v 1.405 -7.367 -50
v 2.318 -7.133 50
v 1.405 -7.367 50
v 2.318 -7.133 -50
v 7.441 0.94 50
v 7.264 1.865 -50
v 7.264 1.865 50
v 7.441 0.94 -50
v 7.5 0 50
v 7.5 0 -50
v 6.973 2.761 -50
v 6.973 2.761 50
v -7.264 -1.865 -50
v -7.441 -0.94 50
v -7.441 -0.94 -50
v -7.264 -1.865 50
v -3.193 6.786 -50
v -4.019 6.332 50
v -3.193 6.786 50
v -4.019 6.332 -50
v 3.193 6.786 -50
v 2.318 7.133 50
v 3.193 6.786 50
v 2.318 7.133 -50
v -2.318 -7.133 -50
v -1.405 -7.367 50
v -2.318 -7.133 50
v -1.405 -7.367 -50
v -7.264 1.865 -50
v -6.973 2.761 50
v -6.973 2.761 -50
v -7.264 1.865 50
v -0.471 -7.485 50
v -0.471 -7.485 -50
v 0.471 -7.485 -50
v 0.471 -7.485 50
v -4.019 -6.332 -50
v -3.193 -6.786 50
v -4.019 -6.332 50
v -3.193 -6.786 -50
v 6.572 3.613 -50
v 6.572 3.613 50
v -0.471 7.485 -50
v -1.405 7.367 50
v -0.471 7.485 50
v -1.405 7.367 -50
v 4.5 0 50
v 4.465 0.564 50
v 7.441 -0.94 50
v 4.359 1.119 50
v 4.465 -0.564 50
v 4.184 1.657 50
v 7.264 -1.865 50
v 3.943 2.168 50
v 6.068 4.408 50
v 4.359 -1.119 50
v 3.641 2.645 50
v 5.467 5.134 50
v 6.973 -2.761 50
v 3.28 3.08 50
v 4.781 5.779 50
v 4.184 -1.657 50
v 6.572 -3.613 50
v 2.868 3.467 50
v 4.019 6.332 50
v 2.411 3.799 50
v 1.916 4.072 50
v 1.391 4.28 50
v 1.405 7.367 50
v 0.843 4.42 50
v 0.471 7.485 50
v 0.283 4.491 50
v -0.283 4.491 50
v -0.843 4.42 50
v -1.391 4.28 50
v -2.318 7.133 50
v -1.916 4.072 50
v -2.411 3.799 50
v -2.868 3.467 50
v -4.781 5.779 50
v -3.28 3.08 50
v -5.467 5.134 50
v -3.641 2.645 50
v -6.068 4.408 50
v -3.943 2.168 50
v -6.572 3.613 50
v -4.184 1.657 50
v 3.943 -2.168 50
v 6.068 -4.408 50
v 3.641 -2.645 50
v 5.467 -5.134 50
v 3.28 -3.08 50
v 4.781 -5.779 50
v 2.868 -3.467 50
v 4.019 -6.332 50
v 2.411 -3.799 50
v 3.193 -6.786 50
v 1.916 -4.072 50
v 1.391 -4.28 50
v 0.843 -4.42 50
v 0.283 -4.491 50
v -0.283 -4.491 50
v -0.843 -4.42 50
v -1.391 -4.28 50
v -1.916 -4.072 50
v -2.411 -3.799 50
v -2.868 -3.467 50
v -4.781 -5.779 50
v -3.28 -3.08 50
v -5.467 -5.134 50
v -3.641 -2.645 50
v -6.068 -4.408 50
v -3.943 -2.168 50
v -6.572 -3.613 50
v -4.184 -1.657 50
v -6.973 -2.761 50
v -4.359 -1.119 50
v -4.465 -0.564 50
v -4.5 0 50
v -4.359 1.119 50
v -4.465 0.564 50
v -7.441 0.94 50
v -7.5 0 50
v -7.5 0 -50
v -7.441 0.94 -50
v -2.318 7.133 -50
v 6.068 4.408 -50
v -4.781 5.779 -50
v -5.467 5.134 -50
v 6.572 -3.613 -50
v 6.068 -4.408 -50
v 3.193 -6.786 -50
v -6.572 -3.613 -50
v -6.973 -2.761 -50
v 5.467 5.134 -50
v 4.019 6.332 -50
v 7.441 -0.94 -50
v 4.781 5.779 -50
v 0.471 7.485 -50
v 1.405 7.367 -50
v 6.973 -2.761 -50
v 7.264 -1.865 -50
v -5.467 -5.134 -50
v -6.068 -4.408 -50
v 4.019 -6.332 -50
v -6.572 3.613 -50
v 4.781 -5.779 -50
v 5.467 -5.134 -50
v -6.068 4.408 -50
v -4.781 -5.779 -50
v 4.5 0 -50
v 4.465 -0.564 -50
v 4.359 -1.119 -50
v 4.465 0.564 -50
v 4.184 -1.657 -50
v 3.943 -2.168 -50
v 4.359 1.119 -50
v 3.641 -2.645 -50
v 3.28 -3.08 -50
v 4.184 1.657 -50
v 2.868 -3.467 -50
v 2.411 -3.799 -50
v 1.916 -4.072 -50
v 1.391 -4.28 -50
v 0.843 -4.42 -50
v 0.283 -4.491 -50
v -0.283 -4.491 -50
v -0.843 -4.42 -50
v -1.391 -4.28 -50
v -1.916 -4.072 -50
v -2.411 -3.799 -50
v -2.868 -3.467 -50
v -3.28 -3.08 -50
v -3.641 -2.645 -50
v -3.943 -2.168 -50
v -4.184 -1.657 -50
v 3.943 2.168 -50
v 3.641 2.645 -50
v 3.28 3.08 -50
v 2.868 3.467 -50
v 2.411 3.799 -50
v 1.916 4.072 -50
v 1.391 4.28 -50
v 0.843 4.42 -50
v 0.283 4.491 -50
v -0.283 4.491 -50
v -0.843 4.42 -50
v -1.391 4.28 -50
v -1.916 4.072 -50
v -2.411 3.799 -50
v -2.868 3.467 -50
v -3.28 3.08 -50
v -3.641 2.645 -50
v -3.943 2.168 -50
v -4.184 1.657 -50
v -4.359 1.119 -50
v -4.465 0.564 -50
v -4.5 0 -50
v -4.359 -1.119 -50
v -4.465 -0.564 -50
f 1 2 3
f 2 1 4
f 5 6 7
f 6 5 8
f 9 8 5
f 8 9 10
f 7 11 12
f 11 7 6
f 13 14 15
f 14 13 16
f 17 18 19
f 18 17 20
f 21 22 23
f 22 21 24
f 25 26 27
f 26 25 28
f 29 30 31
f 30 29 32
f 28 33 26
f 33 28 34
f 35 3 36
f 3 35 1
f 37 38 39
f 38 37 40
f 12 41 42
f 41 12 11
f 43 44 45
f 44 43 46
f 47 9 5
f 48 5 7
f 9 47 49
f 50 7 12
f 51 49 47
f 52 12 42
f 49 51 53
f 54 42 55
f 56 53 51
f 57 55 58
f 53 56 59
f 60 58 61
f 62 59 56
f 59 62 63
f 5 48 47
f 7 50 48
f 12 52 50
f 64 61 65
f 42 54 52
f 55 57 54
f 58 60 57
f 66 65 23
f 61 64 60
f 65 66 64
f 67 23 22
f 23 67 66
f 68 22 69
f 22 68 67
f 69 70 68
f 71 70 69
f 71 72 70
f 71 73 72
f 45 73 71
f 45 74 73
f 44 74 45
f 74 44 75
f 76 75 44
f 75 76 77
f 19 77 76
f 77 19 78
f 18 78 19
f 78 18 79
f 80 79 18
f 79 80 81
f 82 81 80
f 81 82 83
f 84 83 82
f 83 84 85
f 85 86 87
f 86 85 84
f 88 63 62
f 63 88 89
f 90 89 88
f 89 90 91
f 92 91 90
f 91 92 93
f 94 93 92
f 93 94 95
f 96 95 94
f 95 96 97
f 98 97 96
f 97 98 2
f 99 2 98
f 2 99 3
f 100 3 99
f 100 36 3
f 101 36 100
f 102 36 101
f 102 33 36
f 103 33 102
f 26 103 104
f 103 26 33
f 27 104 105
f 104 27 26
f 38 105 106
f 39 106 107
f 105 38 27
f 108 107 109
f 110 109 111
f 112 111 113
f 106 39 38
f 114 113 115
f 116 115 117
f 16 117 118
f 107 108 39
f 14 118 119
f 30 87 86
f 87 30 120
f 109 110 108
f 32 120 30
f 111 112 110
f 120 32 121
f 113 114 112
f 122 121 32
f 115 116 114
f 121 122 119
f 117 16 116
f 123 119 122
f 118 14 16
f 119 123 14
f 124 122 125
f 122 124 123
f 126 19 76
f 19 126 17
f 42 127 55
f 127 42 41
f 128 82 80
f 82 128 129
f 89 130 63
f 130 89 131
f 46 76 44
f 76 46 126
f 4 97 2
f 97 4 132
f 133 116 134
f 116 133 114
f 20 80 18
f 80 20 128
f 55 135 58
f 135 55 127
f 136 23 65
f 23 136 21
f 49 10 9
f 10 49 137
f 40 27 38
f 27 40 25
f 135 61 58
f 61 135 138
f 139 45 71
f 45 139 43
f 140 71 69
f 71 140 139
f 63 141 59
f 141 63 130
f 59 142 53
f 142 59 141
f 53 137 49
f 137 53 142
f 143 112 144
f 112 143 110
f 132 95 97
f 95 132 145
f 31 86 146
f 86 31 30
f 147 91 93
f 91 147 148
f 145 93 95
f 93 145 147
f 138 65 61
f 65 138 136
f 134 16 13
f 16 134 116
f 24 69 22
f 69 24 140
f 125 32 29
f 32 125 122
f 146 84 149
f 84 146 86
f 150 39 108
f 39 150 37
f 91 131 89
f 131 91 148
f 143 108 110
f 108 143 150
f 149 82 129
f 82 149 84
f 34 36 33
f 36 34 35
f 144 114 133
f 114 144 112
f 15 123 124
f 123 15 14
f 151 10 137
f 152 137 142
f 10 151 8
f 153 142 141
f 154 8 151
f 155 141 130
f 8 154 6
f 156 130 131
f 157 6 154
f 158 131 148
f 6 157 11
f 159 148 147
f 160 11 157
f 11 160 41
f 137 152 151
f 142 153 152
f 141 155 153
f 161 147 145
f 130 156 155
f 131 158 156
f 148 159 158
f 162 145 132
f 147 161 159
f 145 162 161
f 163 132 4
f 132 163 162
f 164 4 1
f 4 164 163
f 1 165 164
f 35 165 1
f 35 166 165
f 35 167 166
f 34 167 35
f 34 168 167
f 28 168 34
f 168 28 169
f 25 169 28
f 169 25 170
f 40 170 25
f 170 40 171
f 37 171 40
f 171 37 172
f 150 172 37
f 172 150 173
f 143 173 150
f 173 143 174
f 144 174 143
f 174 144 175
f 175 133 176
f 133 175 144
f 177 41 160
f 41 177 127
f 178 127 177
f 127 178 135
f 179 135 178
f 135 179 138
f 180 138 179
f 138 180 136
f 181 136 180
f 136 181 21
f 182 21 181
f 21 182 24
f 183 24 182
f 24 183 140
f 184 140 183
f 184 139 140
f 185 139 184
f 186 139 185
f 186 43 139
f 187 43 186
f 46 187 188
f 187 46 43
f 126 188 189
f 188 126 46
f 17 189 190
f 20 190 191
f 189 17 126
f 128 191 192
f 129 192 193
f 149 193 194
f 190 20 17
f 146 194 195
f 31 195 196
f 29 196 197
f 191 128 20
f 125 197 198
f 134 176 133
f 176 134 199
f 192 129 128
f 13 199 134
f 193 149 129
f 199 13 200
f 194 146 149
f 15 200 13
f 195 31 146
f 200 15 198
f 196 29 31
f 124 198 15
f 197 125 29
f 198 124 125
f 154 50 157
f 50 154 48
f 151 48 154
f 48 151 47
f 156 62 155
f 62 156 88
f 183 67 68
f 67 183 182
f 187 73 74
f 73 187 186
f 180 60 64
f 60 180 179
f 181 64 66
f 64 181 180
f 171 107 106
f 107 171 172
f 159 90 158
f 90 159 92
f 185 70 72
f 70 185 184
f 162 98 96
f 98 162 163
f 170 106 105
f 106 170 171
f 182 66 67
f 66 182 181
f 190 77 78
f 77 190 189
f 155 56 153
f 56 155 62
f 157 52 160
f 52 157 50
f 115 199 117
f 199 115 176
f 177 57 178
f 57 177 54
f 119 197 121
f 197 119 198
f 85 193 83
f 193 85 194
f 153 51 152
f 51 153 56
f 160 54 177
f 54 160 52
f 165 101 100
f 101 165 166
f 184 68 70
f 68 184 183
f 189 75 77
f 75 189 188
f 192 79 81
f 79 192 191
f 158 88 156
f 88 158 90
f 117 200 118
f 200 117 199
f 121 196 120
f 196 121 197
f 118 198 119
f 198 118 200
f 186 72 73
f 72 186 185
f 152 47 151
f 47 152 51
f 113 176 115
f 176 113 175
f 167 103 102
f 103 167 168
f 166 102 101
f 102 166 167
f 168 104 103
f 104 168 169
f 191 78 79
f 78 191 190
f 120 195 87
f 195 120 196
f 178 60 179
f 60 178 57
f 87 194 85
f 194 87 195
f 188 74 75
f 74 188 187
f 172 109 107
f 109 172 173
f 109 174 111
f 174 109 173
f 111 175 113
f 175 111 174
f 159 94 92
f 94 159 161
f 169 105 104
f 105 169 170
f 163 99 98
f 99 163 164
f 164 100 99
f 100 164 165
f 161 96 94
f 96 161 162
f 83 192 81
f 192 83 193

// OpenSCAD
$fn = 50;


difference() {
	union() {
		translate(v = [0, 0, -50.0000000000]) {
			cylinder(h = 100, r = 7.5000000000);
		}
	}
	union() {
		translate(v = [0, 0, -100.0000000000]) {
			cylinder(h = 200, r = 4.5000000000);
		}
	}
}
